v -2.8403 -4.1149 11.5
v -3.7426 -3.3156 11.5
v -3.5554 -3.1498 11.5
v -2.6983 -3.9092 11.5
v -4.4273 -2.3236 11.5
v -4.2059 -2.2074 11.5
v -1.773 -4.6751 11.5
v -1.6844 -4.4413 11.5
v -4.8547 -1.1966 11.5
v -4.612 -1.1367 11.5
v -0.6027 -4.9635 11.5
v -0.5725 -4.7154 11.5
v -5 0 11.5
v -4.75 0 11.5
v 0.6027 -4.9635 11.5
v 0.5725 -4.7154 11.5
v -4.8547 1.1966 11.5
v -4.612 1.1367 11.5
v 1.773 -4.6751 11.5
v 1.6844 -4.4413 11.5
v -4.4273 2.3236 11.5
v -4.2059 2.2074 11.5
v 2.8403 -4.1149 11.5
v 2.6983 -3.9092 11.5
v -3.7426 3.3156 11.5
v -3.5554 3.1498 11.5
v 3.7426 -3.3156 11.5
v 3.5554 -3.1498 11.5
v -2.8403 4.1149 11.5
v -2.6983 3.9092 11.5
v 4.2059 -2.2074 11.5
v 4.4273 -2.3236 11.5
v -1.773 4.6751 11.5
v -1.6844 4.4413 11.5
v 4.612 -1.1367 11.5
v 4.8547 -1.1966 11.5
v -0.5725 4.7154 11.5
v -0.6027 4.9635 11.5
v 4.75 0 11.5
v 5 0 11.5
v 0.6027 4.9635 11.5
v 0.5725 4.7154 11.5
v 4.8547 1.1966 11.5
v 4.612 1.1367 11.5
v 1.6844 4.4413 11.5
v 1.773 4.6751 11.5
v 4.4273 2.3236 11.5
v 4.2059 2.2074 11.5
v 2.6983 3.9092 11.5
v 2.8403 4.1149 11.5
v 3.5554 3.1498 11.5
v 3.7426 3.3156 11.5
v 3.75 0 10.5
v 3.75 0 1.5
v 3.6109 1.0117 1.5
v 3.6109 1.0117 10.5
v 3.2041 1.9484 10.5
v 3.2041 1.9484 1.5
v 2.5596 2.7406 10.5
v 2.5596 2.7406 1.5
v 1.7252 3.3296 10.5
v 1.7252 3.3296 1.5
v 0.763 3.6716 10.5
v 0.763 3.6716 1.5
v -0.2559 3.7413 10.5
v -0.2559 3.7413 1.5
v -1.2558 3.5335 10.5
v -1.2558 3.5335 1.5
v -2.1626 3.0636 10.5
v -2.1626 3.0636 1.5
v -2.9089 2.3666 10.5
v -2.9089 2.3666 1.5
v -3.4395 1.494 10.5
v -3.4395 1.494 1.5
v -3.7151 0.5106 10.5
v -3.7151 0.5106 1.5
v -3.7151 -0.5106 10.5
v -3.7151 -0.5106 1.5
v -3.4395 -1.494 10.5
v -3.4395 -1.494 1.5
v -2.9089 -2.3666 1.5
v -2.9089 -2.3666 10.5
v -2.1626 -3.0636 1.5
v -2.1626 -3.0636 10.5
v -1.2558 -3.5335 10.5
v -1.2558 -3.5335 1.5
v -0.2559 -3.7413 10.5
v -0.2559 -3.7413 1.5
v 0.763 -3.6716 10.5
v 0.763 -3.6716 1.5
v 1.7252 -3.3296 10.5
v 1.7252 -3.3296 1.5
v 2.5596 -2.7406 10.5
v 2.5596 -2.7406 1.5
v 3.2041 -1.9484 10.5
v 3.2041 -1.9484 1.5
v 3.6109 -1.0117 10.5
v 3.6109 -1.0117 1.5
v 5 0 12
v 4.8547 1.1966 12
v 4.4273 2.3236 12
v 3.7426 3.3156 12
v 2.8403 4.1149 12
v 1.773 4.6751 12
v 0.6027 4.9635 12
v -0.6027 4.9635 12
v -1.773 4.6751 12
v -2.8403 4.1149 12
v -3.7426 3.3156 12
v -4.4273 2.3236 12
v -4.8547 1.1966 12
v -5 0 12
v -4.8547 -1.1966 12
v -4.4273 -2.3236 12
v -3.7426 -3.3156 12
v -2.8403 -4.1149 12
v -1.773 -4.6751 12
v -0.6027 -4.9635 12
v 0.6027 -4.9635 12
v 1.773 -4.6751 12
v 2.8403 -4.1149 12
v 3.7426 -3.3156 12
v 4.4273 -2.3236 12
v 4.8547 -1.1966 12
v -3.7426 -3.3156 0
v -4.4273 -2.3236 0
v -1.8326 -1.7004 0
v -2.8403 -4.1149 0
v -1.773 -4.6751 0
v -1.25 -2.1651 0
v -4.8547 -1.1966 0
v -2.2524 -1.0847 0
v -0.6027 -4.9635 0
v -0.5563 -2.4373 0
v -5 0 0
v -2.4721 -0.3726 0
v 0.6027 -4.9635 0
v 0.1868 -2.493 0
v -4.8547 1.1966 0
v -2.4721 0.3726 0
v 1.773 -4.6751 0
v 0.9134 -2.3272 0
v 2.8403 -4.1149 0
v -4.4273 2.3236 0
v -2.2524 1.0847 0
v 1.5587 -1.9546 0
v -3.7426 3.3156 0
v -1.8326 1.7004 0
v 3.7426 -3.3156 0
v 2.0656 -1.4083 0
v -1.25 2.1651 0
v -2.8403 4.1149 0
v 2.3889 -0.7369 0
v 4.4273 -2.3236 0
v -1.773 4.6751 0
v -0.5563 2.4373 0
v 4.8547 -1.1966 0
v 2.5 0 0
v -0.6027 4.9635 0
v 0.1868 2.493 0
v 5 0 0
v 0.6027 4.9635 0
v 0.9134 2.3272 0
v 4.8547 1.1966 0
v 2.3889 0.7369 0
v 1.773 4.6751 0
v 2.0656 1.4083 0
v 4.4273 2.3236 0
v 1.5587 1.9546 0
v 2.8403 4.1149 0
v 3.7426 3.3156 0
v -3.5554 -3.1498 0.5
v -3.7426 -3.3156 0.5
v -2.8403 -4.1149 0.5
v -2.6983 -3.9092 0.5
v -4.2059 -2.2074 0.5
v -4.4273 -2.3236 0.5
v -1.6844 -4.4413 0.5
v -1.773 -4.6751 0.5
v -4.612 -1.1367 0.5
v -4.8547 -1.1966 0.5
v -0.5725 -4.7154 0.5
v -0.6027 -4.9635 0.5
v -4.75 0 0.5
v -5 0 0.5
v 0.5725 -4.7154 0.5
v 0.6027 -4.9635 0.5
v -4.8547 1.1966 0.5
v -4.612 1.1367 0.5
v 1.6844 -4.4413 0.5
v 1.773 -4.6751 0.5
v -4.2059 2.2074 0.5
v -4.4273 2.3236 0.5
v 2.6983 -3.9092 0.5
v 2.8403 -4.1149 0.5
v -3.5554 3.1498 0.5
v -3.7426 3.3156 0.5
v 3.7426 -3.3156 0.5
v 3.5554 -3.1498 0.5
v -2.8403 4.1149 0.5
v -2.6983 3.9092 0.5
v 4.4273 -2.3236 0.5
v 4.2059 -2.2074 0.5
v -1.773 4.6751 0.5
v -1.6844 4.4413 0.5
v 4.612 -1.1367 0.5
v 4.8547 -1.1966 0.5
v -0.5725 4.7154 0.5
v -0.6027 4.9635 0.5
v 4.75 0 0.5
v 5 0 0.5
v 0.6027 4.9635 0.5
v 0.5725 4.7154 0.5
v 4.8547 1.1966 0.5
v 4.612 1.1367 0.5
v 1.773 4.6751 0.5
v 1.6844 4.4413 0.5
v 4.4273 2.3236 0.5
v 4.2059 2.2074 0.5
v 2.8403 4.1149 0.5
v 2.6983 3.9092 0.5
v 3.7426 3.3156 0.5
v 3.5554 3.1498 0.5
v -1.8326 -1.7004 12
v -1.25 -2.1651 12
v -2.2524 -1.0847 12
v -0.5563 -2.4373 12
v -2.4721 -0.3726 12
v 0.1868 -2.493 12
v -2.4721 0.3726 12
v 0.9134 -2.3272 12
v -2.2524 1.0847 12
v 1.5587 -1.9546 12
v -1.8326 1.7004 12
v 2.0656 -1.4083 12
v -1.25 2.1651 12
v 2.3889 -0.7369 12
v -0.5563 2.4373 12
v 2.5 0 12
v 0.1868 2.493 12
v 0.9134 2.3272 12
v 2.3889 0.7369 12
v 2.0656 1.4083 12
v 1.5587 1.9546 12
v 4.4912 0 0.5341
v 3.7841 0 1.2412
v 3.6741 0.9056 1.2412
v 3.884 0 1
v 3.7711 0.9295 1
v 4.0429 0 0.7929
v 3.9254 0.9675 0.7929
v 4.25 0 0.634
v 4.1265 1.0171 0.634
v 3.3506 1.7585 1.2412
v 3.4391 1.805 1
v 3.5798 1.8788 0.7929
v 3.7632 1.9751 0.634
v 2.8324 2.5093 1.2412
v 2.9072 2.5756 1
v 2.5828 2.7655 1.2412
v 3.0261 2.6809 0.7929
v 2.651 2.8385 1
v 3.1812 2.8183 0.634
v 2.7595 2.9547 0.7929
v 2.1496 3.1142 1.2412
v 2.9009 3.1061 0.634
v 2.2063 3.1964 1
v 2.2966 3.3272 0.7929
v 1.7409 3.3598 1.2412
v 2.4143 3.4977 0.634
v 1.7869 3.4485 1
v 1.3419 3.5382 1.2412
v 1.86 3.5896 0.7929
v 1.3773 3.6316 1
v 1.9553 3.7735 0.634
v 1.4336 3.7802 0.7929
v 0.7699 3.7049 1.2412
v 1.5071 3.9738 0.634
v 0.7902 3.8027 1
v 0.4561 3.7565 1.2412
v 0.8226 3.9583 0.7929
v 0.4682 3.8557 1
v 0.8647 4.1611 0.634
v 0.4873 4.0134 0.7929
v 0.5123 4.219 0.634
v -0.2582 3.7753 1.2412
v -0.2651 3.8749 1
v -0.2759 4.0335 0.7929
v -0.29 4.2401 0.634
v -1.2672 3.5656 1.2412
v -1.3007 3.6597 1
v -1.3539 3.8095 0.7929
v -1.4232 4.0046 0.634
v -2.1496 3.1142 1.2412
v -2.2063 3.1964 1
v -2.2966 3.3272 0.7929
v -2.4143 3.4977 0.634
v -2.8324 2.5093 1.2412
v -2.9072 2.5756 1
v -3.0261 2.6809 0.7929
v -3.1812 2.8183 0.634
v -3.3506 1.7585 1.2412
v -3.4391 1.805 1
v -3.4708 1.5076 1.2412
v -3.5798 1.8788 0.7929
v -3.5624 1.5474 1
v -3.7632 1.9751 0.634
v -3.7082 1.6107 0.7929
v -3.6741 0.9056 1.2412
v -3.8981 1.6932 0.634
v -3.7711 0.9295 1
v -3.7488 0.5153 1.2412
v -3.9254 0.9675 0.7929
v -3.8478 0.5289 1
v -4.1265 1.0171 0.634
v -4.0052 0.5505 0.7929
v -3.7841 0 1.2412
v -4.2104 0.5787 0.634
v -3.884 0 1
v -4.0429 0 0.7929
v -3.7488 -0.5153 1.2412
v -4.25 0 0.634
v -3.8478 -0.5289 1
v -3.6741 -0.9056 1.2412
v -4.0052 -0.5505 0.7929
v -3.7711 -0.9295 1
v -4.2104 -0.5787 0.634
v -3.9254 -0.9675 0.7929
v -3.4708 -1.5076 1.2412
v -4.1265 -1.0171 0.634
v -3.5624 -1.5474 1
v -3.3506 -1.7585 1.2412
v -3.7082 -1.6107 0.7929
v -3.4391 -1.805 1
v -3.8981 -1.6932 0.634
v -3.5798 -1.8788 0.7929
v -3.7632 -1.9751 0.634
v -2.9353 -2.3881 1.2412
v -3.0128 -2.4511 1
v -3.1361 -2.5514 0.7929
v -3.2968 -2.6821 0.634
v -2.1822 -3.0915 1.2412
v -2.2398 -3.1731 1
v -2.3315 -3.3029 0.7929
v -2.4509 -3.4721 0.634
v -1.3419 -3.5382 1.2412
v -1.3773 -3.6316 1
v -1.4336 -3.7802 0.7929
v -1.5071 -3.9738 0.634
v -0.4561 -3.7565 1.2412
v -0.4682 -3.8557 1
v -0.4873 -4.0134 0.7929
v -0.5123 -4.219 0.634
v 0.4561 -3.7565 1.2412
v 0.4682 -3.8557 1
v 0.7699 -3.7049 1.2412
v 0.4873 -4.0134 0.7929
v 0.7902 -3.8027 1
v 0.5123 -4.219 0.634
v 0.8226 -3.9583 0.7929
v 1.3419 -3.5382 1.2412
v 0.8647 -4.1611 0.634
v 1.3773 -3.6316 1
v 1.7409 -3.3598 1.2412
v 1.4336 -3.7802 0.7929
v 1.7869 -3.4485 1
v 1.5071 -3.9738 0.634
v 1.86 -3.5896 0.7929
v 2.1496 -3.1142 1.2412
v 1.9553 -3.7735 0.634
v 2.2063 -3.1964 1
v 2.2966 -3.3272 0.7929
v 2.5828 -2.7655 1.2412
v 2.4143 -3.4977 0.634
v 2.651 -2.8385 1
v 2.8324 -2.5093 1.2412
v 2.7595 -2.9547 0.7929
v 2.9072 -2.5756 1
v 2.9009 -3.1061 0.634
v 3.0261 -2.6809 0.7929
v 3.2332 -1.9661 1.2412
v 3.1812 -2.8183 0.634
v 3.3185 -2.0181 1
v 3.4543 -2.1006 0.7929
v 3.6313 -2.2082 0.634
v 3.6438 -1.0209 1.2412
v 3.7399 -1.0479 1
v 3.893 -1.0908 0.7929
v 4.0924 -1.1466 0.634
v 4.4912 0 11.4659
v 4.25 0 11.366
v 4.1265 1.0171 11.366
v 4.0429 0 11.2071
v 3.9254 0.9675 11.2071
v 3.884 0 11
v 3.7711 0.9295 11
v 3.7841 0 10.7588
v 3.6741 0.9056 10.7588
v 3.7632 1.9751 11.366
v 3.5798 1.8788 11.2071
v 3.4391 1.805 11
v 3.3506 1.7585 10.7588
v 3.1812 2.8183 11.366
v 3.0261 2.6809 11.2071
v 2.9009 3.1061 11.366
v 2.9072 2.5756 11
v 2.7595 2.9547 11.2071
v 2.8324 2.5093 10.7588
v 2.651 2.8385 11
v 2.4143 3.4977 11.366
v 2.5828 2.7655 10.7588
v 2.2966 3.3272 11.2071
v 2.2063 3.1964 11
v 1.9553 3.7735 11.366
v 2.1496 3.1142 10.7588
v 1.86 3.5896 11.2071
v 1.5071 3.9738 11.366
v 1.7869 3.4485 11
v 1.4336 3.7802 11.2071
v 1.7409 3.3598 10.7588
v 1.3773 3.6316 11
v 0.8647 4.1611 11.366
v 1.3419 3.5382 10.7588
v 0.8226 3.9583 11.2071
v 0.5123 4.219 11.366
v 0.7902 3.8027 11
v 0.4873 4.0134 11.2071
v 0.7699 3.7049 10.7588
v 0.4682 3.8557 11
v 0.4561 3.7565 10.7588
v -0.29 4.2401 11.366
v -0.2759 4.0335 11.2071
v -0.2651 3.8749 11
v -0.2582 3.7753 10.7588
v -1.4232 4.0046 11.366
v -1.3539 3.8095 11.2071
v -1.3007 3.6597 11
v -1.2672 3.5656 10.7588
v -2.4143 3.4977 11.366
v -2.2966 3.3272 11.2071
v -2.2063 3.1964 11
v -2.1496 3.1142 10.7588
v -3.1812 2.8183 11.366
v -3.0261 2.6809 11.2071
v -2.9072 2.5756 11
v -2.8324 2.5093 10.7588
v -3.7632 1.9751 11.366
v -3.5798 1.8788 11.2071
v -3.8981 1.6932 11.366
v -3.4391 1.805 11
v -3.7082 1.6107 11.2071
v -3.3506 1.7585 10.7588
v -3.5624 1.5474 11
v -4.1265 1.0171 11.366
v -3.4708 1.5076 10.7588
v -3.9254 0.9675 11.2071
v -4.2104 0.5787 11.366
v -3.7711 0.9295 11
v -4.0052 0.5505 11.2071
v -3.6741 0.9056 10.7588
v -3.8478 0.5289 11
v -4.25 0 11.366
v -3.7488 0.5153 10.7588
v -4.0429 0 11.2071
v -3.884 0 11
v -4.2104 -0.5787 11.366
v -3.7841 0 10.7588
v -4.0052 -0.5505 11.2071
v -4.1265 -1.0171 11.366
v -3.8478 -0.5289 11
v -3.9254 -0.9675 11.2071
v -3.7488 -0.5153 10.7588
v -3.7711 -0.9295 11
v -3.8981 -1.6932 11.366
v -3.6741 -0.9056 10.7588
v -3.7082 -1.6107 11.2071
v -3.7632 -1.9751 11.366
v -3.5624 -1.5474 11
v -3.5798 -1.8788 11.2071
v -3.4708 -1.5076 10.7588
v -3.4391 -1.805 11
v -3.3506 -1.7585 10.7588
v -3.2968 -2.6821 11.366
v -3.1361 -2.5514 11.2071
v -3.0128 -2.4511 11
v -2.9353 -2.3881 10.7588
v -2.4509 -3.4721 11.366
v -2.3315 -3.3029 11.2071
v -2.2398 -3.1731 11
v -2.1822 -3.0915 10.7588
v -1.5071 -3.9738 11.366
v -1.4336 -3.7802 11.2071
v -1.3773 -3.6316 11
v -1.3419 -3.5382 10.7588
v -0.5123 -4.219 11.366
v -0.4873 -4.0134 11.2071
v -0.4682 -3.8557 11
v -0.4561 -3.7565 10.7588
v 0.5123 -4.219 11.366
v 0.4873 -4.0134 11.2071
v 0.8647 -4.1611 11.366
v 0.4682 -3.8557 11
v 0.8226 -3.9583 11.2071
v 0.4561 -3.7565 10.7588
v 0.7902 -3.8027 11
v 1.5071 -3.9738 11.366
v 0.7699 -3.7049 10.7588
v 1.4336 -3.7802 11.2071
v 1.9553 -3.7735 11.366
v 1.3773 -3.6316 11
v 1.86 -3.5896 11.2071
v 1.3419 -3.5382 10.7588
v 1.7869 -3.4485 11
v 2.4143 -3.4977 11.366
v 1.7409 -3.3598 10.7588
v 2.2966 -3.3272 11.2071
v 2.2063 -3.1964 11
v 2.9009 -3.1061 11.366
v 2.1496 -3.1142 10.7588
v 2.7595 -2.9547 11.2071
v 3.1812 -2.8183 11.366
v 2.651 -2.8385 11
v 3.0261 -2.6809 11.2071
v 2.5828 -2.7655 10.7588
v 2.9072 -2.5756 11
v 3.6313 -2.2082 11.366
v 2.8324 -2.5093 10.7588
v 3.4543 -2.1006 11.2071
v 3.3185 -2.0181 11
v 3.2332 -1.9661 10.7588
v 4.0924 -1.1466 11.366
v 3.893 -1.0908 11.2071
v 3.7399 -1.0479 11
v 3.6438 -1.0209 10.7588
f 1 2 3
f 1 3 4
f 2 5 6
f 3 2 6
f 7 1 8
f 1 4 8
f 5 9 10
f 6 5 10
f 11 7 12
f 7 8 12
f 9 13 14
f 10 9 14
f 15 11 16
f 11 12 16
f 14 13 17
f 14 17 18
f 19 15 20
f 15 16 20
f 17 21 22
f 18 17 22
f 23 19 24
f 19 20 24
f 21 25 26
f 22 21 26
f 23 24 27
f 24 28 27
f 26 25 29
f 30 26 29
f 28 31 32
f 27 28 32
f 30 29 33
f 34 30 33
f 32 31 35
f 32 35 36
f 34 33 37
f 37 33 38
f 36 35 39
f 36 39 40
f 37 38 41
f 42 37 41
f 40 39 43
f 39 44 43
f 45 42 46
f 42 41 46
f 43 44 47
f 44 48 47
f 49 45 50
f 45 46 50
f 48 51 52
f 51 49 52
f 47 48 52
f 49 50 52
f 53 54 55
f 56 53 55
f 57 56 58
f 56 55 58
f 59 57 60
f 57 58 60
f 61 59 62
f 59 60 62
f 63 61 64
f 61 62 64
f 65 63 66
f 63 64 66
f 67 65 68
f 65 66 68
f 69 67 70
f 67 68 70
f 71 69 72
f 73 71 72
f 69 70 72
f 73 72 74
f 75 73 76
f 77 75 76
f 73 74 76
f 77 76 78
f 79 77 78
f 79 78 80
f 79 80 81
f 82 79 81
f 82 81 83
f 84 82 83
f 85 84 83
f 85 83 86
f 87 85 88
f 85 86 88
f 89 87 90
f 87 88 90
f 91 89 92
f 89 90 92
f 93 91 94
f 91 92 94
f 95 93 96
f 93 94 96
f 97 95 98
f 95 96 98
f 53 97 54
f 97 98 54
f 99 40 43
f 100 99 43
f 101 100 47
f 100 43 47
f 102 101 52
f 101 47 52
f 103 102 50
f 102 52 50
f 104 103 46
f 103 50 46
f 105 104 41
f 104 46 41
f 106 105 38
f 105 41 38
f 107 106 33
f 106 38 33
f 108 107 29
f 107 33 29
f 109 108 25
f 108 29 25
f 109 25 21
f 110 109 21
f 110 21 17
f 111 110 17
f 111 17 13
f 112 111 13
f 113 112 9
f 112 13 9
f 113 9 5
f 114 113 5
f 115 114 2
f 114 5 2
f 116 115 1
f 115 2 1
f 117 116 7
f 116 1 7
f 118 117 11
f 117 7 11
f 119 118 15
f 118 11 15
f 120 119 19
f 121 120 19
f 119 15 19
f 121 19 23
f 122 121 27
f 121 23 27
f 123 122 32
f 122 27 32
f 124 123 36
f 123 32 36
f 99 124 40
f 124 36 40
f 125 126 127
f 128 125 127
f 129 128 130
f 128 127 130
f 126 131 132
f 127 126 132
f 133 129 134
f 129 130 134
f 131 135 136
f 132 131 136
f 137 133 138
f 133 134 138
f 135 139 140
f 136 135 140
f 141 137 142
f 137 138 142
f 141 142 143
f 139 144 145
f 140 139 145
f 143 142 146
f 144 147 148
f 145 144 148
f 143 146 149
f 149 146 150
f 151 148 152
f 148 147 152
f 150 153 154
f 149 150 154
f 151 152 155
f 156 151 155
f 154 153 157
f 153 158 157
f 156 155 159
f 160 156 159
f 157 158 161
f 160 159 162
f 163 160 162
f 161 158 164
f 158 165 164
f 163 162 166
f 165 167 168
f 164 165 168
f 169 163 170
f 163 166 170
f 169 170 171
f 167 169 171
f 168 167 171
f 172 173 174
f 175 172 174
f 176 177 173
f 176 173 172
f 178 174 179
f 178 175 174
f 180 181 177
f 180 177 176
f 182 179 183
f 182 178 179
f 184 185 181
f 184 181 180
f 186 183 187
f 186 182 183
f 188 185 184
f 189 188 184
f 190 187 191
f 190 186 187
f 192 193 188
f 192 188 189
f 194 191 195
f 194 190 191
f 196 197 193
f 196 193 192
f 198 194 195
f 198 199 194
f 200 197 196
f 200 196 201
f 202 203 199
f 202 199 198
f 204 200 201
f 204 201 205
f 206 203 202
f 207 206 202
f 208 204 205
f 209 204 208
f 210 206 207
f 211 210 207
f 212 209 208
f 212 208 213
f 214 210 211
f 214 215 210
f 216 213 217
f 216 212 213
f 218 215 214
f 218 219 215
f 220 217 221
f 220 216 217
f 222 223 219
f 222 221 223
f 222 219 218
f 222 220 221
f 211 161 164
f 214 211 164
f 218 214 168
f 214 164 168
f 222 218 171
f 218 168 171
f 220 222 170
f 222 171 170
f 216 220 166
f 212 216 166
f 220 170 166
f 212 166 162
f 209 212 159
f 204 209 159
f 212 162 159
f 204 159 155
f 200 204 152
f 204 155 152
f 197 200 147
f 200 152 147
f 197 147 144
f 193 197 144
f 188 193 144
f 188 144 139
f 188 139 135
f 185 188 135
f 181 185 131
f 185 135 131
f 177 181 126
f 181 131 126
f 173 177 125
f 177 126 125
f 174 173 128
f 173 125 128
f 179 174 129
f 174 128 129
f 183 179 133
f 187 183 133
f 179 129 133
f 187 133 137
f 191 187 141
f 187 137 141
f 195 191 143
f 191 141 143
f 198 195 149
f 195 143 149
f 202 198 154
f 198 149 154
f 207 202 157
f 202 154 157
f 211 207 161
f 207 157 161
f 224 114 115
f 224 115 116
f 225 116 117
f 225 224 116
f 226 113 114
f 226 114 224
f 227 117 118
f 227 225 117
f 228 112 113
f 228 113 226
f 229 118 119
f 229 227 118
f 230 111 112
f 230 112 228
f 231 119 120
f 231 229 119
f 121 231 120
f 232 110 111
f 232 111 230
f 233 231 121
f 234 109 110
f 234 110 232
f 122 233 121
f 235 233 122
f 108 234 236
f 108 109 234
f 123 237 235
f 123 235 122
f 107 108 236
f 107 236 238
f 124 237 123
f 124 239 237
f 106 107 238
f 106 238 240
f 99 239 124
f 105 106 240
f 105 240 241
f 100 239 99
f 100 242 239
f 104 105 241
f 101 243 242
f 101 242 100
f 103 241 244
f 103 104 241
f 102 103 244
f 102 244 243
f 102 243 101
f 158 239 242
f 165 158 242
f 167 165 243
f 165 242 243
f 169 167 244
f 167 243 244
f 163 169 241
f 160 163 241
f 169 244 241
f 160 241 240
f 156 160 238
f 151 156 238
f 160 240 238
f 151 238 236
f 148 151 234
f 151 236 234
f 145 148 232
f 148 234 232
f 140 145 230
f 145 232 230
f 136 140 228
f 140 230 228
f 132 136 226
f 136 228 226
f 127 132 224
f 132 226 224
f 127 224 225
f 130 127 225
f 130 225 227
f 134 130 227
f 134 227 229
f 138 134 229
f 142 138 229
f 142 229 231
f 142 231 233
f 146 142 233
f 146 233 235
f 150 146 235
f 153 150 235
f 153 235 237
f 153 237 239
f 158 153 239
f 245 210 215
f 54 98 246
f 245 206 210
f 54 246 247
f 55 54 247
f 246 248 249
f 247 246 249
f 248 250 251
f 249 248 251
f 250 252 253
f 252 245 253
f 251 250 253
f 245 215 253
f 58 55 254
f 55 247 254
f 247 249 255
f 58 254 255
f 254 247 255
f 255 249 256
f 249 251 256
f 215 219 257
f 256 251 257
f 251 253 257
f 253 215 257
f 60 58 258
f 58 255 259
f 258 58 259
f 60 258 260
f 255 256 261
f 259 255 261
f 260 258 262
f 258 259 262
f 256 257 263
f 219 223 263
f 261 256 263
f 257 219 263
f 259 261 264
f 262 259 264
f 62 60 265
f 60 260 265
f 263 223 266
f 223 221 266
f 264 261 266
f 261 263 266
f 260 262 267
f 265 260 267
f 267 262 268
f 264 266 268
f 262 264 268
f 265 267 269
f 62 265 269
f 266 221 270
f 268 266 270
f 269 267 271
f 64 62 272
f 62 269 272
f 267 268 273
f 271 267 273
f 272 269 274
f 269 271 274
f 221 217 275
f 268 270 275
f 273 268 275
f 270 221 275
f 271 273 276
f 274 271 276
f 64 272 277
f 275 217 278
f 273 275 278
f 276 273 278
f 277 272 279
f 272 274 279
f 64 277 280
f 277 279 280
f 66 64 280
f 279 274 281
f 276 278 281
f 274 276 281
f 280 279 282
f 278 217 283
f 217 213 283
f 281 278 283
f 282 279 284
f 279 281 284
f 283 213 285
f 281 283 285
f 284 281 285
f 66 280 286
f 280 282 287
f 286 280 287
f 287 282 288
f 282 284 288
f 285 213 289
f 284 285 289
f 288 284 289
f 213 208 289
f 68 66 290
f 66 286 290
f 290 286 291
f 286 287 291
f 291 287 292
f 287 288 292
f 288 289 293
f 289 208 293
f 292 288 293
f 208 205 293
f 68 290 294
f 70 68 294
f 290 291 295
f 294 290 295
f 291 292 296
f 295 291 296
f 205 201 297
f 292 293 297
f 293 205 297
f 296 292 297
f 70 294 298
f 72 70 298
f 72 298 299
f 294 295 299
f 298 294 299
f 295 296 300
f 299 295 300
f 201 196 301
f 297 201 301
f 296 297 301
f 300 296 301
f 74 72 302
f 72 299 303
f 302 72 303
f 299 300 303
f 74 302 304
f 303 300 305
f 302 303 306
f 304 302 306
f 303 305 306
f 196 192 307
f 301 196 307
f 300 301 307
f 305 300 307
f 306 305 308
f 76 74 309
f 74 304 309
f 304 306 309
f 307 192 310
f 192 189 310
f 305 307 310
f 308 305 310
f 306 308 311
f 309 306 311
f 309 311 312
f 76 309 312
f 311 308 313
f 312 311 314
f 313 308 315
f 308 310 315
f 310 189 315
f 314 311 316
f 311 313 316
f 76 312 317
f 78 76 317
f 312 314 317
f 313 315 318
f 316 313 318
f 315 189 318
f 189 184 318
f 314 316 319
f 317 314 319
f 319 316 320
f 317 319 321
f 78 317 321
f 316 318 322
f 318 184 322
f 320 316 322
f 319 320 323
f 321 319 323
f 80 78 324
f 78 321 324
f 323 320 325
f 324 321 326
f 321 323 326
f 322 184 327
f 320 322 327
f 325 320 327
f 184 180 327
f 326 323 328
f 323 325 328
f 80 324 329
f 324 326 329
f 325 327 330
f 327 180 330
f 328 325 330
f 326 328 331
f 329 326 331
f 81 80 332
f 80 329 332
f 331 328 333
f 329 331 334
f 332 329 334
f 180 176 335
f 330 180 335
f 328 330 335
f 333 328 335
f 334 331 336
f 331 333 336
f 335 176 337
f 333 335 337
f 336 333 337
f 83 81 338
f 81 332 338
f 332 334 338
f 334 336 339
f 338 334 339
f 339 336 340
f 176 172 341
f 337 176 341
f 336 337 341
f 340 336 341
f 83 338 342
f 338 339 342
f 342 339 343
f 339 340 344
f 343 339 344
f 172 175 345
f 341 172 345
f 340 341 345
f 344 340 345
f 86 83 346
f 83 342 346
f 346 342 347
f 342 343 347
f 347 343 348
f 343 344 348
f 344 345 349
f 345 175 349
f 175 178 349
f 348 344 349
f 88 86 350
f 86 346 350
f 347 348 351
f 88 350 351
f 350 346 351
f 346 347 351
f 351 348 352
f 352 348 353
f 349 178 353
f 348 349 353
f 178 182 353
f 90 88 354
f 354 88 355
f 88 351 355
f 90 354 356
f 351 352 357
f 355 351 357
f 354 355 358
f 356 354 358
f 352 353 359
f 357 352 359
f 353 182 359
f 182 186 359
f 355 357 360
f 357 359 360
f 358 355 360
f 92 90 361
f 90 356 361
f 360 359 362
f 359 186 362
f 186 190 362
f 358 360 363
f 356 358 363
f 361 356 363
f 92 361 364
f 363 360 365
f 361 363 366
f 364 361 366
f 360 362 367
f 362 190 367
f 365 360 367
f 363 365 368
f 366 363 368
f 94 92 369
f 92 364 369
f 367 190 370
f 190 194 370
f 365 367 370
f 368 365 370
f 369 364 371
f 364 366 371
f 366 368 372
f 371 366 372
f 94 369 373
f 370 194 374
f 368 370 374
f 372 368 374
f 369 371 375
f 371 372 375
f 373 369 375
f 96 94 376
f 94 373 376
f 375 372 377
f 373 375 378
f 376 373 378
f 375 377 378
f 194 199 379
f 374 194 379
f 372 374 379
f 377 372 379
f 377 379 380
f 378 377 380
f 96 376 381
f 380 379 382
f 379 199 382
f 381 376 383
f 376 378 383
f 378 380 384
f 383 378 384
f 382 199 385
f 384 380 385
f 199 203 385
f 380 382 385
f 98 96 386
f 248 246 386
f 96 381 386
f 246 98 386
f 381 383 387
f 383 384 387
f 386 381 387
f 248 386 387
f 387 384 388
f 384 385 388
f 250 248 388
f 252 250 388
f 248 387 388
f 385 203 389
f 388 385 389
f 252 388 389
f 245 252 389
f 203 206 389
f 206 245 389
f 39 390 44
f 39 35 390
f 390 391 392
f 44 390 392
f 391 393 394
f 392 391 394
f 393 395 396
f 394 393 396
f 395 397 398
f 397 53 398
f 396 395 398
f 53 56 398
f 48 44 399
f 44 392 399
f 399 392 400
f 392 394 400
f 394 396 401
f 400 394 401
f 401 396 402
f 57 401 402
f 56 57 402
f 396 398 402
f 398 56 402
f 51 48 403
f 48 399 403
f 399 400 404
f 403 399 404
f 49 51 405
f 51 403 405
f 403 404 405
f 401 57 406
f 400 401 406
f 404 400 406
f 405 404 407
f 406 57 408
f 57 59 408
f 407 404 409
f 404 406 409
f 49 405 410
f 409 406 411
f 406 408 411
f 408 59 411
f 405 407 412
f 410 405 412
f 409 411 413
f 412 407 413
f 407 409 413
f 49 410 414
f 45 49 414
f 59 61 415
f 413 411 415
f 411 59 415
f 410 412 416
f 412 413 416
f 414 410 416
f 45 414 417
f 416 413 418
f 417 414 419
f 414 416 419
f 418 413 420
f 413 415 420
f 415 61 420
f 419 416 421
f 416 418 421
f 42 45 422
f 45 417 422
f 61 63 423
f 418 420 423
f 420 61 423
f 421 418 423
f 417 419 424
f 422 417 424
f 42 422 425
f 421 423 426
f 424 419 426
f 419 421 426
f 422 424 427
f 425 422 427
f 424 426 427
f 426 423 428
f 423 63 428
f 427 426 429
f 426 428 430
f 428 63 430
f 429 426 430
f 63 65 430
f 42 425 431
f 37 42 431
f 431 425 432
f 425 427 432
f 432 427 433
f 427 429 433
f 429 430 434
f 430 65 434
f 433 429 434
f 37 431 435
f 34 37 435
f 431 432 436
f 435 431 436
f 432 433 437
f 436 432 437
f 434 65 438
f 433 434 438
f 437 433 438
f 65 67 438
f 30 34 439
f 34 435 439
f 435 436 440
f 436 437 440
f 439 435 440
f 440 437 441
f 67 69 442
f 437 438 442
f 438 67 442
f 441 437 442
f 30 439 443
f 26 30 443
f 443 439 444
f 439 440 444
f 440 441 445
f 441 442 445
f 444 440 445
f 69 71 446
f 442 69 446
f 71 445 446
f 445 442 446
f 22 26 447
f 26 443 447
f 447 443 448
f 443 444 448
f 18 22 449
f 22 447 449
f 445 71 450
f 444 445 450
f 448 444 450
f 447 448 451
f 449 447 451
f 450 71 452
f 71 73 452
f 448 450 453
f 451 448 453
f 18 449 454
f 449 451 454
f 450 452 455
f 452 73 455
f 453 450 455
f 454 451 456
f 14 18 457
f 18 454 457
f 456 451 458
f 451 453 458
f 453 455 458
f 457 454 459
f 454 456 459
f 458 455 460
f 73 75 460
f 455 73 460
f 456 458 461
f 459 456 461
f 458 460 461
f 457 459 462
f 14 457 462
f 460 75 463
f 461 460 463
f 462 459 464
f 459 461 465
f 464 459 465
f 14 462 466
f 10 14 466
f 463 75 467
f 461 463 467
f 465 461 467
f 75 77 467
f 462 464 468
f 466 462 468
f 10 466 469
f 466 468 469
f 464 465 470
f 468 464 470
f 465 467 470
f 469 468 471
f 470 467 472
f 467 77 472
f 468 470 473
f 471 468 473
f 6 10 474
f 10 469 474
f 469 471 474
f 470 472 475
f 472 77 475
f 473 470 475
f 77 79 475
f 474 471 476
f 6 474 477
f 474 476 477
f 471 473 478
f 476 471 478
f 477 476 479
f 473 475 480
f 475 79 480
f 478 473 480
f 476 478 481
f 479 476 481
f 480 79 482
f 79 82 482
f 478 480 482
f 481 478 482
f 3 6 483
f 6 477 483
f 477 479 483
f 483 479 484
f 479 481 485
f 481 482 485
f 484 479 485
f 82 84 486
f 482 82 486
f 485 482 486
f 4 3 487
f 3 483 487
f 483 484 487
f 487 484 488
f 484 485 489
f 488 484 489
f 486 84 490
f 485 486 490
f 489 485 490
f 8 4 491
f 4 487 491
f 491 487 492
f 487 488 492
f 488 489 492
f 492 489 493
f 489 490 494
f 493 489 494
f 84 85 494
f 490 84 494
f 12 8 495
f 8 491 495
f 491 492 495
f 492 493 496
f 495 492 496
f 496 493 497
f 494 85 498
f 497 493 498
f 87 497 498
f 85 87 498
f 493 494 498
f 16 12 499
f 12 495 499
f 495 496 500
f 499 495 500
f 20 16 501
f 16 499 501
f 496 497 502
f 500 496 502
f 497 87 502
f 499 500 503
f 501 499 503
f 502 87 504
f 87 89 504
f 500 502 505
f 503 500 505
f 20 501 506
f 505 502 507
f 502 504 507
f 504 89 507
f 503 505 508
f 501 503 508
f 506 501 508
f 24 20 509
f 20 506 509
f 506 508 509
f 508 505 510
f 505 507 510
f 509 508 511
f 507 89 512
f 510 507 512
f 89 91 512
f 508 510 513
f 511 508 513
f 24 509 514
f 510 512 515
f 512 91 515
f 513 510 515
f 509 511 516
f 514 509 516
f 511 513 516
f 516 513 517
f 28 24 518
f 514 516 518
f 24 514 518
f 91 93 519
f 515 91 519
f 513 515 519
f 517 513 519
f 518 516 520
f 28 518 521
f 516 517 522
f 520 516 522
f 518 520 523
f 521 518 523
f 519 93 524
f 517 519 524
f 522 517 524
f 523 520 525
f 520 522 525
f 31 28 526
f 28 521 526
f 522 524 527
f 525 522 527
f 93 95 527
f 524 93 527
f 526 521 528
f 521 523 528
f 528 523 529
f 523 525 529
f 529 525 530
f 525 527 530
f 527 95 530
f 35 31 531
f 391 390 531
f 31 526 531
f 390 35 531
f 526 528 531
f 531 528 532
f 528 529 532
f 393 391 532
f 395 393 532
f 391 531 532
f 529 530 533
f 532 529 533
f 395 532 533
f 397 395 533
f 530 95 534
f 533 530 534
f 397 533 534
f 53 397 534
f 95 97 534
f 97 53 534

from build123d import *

# Parameters (mm, degrees)
SKETCH_1_R          = 5
EXTRUDE_1_DEPTH     = 0.5
SKETCH_2_R          = 3.75
EXTRUDE_2_DEPTH     = 11
SKETCH_3_R          = 5
EXTRUDE_3_DEPTH     = 0.5
SKETCH_4_R          = 2.5
CUT_EXTRUDE_1_DEPTH = 14.928388277
FILLET_1_R          = 1


with BuildPart() as part:
    # 草图1 → 凸台-拉伸1 (new body)
    with BuildSketch(Plane.XY):
        Circle(SKETCH_1_R)
    extrude(amount=EXTRUDE_1_DEPTH)

    # 草图2 → 凸台-拉伸2 (add)
    with BuildSketch(Plane.XY.offset(0.5)):
        Circle(SKETCH_2_R)
    extrude(amount=EXTRUDE_2_DEPTH)

    # 草图3 → 凸台-拉伸3 (add)
    with BuildSketch(Plane.XY.offset(11.5)):
        Circle(SKETCH_3_R)
    extrude(amount=EXTRUDE_3_DEPTH)

    # 草图4 → 切除-拉伸1 (cut, through all)
    with BuildSketch(Plane.XY.offset(12)):
        Circle(SKETCH_4_R)
    extrude(amount=-CUT_EXTRUDE_1_DEPTH, mode=Mode.SUBTRACT)

    # 圆角1
    fillet_1_edges = [part.edges().sort_by_distance(p)[0] for p in [
        (-3.75, 0, 0.5),
        (-3.75, 0, 11.5),
    ]]
    fillet(fillet_1_edges, radius=FILLET_1_R)


solid = part.part
